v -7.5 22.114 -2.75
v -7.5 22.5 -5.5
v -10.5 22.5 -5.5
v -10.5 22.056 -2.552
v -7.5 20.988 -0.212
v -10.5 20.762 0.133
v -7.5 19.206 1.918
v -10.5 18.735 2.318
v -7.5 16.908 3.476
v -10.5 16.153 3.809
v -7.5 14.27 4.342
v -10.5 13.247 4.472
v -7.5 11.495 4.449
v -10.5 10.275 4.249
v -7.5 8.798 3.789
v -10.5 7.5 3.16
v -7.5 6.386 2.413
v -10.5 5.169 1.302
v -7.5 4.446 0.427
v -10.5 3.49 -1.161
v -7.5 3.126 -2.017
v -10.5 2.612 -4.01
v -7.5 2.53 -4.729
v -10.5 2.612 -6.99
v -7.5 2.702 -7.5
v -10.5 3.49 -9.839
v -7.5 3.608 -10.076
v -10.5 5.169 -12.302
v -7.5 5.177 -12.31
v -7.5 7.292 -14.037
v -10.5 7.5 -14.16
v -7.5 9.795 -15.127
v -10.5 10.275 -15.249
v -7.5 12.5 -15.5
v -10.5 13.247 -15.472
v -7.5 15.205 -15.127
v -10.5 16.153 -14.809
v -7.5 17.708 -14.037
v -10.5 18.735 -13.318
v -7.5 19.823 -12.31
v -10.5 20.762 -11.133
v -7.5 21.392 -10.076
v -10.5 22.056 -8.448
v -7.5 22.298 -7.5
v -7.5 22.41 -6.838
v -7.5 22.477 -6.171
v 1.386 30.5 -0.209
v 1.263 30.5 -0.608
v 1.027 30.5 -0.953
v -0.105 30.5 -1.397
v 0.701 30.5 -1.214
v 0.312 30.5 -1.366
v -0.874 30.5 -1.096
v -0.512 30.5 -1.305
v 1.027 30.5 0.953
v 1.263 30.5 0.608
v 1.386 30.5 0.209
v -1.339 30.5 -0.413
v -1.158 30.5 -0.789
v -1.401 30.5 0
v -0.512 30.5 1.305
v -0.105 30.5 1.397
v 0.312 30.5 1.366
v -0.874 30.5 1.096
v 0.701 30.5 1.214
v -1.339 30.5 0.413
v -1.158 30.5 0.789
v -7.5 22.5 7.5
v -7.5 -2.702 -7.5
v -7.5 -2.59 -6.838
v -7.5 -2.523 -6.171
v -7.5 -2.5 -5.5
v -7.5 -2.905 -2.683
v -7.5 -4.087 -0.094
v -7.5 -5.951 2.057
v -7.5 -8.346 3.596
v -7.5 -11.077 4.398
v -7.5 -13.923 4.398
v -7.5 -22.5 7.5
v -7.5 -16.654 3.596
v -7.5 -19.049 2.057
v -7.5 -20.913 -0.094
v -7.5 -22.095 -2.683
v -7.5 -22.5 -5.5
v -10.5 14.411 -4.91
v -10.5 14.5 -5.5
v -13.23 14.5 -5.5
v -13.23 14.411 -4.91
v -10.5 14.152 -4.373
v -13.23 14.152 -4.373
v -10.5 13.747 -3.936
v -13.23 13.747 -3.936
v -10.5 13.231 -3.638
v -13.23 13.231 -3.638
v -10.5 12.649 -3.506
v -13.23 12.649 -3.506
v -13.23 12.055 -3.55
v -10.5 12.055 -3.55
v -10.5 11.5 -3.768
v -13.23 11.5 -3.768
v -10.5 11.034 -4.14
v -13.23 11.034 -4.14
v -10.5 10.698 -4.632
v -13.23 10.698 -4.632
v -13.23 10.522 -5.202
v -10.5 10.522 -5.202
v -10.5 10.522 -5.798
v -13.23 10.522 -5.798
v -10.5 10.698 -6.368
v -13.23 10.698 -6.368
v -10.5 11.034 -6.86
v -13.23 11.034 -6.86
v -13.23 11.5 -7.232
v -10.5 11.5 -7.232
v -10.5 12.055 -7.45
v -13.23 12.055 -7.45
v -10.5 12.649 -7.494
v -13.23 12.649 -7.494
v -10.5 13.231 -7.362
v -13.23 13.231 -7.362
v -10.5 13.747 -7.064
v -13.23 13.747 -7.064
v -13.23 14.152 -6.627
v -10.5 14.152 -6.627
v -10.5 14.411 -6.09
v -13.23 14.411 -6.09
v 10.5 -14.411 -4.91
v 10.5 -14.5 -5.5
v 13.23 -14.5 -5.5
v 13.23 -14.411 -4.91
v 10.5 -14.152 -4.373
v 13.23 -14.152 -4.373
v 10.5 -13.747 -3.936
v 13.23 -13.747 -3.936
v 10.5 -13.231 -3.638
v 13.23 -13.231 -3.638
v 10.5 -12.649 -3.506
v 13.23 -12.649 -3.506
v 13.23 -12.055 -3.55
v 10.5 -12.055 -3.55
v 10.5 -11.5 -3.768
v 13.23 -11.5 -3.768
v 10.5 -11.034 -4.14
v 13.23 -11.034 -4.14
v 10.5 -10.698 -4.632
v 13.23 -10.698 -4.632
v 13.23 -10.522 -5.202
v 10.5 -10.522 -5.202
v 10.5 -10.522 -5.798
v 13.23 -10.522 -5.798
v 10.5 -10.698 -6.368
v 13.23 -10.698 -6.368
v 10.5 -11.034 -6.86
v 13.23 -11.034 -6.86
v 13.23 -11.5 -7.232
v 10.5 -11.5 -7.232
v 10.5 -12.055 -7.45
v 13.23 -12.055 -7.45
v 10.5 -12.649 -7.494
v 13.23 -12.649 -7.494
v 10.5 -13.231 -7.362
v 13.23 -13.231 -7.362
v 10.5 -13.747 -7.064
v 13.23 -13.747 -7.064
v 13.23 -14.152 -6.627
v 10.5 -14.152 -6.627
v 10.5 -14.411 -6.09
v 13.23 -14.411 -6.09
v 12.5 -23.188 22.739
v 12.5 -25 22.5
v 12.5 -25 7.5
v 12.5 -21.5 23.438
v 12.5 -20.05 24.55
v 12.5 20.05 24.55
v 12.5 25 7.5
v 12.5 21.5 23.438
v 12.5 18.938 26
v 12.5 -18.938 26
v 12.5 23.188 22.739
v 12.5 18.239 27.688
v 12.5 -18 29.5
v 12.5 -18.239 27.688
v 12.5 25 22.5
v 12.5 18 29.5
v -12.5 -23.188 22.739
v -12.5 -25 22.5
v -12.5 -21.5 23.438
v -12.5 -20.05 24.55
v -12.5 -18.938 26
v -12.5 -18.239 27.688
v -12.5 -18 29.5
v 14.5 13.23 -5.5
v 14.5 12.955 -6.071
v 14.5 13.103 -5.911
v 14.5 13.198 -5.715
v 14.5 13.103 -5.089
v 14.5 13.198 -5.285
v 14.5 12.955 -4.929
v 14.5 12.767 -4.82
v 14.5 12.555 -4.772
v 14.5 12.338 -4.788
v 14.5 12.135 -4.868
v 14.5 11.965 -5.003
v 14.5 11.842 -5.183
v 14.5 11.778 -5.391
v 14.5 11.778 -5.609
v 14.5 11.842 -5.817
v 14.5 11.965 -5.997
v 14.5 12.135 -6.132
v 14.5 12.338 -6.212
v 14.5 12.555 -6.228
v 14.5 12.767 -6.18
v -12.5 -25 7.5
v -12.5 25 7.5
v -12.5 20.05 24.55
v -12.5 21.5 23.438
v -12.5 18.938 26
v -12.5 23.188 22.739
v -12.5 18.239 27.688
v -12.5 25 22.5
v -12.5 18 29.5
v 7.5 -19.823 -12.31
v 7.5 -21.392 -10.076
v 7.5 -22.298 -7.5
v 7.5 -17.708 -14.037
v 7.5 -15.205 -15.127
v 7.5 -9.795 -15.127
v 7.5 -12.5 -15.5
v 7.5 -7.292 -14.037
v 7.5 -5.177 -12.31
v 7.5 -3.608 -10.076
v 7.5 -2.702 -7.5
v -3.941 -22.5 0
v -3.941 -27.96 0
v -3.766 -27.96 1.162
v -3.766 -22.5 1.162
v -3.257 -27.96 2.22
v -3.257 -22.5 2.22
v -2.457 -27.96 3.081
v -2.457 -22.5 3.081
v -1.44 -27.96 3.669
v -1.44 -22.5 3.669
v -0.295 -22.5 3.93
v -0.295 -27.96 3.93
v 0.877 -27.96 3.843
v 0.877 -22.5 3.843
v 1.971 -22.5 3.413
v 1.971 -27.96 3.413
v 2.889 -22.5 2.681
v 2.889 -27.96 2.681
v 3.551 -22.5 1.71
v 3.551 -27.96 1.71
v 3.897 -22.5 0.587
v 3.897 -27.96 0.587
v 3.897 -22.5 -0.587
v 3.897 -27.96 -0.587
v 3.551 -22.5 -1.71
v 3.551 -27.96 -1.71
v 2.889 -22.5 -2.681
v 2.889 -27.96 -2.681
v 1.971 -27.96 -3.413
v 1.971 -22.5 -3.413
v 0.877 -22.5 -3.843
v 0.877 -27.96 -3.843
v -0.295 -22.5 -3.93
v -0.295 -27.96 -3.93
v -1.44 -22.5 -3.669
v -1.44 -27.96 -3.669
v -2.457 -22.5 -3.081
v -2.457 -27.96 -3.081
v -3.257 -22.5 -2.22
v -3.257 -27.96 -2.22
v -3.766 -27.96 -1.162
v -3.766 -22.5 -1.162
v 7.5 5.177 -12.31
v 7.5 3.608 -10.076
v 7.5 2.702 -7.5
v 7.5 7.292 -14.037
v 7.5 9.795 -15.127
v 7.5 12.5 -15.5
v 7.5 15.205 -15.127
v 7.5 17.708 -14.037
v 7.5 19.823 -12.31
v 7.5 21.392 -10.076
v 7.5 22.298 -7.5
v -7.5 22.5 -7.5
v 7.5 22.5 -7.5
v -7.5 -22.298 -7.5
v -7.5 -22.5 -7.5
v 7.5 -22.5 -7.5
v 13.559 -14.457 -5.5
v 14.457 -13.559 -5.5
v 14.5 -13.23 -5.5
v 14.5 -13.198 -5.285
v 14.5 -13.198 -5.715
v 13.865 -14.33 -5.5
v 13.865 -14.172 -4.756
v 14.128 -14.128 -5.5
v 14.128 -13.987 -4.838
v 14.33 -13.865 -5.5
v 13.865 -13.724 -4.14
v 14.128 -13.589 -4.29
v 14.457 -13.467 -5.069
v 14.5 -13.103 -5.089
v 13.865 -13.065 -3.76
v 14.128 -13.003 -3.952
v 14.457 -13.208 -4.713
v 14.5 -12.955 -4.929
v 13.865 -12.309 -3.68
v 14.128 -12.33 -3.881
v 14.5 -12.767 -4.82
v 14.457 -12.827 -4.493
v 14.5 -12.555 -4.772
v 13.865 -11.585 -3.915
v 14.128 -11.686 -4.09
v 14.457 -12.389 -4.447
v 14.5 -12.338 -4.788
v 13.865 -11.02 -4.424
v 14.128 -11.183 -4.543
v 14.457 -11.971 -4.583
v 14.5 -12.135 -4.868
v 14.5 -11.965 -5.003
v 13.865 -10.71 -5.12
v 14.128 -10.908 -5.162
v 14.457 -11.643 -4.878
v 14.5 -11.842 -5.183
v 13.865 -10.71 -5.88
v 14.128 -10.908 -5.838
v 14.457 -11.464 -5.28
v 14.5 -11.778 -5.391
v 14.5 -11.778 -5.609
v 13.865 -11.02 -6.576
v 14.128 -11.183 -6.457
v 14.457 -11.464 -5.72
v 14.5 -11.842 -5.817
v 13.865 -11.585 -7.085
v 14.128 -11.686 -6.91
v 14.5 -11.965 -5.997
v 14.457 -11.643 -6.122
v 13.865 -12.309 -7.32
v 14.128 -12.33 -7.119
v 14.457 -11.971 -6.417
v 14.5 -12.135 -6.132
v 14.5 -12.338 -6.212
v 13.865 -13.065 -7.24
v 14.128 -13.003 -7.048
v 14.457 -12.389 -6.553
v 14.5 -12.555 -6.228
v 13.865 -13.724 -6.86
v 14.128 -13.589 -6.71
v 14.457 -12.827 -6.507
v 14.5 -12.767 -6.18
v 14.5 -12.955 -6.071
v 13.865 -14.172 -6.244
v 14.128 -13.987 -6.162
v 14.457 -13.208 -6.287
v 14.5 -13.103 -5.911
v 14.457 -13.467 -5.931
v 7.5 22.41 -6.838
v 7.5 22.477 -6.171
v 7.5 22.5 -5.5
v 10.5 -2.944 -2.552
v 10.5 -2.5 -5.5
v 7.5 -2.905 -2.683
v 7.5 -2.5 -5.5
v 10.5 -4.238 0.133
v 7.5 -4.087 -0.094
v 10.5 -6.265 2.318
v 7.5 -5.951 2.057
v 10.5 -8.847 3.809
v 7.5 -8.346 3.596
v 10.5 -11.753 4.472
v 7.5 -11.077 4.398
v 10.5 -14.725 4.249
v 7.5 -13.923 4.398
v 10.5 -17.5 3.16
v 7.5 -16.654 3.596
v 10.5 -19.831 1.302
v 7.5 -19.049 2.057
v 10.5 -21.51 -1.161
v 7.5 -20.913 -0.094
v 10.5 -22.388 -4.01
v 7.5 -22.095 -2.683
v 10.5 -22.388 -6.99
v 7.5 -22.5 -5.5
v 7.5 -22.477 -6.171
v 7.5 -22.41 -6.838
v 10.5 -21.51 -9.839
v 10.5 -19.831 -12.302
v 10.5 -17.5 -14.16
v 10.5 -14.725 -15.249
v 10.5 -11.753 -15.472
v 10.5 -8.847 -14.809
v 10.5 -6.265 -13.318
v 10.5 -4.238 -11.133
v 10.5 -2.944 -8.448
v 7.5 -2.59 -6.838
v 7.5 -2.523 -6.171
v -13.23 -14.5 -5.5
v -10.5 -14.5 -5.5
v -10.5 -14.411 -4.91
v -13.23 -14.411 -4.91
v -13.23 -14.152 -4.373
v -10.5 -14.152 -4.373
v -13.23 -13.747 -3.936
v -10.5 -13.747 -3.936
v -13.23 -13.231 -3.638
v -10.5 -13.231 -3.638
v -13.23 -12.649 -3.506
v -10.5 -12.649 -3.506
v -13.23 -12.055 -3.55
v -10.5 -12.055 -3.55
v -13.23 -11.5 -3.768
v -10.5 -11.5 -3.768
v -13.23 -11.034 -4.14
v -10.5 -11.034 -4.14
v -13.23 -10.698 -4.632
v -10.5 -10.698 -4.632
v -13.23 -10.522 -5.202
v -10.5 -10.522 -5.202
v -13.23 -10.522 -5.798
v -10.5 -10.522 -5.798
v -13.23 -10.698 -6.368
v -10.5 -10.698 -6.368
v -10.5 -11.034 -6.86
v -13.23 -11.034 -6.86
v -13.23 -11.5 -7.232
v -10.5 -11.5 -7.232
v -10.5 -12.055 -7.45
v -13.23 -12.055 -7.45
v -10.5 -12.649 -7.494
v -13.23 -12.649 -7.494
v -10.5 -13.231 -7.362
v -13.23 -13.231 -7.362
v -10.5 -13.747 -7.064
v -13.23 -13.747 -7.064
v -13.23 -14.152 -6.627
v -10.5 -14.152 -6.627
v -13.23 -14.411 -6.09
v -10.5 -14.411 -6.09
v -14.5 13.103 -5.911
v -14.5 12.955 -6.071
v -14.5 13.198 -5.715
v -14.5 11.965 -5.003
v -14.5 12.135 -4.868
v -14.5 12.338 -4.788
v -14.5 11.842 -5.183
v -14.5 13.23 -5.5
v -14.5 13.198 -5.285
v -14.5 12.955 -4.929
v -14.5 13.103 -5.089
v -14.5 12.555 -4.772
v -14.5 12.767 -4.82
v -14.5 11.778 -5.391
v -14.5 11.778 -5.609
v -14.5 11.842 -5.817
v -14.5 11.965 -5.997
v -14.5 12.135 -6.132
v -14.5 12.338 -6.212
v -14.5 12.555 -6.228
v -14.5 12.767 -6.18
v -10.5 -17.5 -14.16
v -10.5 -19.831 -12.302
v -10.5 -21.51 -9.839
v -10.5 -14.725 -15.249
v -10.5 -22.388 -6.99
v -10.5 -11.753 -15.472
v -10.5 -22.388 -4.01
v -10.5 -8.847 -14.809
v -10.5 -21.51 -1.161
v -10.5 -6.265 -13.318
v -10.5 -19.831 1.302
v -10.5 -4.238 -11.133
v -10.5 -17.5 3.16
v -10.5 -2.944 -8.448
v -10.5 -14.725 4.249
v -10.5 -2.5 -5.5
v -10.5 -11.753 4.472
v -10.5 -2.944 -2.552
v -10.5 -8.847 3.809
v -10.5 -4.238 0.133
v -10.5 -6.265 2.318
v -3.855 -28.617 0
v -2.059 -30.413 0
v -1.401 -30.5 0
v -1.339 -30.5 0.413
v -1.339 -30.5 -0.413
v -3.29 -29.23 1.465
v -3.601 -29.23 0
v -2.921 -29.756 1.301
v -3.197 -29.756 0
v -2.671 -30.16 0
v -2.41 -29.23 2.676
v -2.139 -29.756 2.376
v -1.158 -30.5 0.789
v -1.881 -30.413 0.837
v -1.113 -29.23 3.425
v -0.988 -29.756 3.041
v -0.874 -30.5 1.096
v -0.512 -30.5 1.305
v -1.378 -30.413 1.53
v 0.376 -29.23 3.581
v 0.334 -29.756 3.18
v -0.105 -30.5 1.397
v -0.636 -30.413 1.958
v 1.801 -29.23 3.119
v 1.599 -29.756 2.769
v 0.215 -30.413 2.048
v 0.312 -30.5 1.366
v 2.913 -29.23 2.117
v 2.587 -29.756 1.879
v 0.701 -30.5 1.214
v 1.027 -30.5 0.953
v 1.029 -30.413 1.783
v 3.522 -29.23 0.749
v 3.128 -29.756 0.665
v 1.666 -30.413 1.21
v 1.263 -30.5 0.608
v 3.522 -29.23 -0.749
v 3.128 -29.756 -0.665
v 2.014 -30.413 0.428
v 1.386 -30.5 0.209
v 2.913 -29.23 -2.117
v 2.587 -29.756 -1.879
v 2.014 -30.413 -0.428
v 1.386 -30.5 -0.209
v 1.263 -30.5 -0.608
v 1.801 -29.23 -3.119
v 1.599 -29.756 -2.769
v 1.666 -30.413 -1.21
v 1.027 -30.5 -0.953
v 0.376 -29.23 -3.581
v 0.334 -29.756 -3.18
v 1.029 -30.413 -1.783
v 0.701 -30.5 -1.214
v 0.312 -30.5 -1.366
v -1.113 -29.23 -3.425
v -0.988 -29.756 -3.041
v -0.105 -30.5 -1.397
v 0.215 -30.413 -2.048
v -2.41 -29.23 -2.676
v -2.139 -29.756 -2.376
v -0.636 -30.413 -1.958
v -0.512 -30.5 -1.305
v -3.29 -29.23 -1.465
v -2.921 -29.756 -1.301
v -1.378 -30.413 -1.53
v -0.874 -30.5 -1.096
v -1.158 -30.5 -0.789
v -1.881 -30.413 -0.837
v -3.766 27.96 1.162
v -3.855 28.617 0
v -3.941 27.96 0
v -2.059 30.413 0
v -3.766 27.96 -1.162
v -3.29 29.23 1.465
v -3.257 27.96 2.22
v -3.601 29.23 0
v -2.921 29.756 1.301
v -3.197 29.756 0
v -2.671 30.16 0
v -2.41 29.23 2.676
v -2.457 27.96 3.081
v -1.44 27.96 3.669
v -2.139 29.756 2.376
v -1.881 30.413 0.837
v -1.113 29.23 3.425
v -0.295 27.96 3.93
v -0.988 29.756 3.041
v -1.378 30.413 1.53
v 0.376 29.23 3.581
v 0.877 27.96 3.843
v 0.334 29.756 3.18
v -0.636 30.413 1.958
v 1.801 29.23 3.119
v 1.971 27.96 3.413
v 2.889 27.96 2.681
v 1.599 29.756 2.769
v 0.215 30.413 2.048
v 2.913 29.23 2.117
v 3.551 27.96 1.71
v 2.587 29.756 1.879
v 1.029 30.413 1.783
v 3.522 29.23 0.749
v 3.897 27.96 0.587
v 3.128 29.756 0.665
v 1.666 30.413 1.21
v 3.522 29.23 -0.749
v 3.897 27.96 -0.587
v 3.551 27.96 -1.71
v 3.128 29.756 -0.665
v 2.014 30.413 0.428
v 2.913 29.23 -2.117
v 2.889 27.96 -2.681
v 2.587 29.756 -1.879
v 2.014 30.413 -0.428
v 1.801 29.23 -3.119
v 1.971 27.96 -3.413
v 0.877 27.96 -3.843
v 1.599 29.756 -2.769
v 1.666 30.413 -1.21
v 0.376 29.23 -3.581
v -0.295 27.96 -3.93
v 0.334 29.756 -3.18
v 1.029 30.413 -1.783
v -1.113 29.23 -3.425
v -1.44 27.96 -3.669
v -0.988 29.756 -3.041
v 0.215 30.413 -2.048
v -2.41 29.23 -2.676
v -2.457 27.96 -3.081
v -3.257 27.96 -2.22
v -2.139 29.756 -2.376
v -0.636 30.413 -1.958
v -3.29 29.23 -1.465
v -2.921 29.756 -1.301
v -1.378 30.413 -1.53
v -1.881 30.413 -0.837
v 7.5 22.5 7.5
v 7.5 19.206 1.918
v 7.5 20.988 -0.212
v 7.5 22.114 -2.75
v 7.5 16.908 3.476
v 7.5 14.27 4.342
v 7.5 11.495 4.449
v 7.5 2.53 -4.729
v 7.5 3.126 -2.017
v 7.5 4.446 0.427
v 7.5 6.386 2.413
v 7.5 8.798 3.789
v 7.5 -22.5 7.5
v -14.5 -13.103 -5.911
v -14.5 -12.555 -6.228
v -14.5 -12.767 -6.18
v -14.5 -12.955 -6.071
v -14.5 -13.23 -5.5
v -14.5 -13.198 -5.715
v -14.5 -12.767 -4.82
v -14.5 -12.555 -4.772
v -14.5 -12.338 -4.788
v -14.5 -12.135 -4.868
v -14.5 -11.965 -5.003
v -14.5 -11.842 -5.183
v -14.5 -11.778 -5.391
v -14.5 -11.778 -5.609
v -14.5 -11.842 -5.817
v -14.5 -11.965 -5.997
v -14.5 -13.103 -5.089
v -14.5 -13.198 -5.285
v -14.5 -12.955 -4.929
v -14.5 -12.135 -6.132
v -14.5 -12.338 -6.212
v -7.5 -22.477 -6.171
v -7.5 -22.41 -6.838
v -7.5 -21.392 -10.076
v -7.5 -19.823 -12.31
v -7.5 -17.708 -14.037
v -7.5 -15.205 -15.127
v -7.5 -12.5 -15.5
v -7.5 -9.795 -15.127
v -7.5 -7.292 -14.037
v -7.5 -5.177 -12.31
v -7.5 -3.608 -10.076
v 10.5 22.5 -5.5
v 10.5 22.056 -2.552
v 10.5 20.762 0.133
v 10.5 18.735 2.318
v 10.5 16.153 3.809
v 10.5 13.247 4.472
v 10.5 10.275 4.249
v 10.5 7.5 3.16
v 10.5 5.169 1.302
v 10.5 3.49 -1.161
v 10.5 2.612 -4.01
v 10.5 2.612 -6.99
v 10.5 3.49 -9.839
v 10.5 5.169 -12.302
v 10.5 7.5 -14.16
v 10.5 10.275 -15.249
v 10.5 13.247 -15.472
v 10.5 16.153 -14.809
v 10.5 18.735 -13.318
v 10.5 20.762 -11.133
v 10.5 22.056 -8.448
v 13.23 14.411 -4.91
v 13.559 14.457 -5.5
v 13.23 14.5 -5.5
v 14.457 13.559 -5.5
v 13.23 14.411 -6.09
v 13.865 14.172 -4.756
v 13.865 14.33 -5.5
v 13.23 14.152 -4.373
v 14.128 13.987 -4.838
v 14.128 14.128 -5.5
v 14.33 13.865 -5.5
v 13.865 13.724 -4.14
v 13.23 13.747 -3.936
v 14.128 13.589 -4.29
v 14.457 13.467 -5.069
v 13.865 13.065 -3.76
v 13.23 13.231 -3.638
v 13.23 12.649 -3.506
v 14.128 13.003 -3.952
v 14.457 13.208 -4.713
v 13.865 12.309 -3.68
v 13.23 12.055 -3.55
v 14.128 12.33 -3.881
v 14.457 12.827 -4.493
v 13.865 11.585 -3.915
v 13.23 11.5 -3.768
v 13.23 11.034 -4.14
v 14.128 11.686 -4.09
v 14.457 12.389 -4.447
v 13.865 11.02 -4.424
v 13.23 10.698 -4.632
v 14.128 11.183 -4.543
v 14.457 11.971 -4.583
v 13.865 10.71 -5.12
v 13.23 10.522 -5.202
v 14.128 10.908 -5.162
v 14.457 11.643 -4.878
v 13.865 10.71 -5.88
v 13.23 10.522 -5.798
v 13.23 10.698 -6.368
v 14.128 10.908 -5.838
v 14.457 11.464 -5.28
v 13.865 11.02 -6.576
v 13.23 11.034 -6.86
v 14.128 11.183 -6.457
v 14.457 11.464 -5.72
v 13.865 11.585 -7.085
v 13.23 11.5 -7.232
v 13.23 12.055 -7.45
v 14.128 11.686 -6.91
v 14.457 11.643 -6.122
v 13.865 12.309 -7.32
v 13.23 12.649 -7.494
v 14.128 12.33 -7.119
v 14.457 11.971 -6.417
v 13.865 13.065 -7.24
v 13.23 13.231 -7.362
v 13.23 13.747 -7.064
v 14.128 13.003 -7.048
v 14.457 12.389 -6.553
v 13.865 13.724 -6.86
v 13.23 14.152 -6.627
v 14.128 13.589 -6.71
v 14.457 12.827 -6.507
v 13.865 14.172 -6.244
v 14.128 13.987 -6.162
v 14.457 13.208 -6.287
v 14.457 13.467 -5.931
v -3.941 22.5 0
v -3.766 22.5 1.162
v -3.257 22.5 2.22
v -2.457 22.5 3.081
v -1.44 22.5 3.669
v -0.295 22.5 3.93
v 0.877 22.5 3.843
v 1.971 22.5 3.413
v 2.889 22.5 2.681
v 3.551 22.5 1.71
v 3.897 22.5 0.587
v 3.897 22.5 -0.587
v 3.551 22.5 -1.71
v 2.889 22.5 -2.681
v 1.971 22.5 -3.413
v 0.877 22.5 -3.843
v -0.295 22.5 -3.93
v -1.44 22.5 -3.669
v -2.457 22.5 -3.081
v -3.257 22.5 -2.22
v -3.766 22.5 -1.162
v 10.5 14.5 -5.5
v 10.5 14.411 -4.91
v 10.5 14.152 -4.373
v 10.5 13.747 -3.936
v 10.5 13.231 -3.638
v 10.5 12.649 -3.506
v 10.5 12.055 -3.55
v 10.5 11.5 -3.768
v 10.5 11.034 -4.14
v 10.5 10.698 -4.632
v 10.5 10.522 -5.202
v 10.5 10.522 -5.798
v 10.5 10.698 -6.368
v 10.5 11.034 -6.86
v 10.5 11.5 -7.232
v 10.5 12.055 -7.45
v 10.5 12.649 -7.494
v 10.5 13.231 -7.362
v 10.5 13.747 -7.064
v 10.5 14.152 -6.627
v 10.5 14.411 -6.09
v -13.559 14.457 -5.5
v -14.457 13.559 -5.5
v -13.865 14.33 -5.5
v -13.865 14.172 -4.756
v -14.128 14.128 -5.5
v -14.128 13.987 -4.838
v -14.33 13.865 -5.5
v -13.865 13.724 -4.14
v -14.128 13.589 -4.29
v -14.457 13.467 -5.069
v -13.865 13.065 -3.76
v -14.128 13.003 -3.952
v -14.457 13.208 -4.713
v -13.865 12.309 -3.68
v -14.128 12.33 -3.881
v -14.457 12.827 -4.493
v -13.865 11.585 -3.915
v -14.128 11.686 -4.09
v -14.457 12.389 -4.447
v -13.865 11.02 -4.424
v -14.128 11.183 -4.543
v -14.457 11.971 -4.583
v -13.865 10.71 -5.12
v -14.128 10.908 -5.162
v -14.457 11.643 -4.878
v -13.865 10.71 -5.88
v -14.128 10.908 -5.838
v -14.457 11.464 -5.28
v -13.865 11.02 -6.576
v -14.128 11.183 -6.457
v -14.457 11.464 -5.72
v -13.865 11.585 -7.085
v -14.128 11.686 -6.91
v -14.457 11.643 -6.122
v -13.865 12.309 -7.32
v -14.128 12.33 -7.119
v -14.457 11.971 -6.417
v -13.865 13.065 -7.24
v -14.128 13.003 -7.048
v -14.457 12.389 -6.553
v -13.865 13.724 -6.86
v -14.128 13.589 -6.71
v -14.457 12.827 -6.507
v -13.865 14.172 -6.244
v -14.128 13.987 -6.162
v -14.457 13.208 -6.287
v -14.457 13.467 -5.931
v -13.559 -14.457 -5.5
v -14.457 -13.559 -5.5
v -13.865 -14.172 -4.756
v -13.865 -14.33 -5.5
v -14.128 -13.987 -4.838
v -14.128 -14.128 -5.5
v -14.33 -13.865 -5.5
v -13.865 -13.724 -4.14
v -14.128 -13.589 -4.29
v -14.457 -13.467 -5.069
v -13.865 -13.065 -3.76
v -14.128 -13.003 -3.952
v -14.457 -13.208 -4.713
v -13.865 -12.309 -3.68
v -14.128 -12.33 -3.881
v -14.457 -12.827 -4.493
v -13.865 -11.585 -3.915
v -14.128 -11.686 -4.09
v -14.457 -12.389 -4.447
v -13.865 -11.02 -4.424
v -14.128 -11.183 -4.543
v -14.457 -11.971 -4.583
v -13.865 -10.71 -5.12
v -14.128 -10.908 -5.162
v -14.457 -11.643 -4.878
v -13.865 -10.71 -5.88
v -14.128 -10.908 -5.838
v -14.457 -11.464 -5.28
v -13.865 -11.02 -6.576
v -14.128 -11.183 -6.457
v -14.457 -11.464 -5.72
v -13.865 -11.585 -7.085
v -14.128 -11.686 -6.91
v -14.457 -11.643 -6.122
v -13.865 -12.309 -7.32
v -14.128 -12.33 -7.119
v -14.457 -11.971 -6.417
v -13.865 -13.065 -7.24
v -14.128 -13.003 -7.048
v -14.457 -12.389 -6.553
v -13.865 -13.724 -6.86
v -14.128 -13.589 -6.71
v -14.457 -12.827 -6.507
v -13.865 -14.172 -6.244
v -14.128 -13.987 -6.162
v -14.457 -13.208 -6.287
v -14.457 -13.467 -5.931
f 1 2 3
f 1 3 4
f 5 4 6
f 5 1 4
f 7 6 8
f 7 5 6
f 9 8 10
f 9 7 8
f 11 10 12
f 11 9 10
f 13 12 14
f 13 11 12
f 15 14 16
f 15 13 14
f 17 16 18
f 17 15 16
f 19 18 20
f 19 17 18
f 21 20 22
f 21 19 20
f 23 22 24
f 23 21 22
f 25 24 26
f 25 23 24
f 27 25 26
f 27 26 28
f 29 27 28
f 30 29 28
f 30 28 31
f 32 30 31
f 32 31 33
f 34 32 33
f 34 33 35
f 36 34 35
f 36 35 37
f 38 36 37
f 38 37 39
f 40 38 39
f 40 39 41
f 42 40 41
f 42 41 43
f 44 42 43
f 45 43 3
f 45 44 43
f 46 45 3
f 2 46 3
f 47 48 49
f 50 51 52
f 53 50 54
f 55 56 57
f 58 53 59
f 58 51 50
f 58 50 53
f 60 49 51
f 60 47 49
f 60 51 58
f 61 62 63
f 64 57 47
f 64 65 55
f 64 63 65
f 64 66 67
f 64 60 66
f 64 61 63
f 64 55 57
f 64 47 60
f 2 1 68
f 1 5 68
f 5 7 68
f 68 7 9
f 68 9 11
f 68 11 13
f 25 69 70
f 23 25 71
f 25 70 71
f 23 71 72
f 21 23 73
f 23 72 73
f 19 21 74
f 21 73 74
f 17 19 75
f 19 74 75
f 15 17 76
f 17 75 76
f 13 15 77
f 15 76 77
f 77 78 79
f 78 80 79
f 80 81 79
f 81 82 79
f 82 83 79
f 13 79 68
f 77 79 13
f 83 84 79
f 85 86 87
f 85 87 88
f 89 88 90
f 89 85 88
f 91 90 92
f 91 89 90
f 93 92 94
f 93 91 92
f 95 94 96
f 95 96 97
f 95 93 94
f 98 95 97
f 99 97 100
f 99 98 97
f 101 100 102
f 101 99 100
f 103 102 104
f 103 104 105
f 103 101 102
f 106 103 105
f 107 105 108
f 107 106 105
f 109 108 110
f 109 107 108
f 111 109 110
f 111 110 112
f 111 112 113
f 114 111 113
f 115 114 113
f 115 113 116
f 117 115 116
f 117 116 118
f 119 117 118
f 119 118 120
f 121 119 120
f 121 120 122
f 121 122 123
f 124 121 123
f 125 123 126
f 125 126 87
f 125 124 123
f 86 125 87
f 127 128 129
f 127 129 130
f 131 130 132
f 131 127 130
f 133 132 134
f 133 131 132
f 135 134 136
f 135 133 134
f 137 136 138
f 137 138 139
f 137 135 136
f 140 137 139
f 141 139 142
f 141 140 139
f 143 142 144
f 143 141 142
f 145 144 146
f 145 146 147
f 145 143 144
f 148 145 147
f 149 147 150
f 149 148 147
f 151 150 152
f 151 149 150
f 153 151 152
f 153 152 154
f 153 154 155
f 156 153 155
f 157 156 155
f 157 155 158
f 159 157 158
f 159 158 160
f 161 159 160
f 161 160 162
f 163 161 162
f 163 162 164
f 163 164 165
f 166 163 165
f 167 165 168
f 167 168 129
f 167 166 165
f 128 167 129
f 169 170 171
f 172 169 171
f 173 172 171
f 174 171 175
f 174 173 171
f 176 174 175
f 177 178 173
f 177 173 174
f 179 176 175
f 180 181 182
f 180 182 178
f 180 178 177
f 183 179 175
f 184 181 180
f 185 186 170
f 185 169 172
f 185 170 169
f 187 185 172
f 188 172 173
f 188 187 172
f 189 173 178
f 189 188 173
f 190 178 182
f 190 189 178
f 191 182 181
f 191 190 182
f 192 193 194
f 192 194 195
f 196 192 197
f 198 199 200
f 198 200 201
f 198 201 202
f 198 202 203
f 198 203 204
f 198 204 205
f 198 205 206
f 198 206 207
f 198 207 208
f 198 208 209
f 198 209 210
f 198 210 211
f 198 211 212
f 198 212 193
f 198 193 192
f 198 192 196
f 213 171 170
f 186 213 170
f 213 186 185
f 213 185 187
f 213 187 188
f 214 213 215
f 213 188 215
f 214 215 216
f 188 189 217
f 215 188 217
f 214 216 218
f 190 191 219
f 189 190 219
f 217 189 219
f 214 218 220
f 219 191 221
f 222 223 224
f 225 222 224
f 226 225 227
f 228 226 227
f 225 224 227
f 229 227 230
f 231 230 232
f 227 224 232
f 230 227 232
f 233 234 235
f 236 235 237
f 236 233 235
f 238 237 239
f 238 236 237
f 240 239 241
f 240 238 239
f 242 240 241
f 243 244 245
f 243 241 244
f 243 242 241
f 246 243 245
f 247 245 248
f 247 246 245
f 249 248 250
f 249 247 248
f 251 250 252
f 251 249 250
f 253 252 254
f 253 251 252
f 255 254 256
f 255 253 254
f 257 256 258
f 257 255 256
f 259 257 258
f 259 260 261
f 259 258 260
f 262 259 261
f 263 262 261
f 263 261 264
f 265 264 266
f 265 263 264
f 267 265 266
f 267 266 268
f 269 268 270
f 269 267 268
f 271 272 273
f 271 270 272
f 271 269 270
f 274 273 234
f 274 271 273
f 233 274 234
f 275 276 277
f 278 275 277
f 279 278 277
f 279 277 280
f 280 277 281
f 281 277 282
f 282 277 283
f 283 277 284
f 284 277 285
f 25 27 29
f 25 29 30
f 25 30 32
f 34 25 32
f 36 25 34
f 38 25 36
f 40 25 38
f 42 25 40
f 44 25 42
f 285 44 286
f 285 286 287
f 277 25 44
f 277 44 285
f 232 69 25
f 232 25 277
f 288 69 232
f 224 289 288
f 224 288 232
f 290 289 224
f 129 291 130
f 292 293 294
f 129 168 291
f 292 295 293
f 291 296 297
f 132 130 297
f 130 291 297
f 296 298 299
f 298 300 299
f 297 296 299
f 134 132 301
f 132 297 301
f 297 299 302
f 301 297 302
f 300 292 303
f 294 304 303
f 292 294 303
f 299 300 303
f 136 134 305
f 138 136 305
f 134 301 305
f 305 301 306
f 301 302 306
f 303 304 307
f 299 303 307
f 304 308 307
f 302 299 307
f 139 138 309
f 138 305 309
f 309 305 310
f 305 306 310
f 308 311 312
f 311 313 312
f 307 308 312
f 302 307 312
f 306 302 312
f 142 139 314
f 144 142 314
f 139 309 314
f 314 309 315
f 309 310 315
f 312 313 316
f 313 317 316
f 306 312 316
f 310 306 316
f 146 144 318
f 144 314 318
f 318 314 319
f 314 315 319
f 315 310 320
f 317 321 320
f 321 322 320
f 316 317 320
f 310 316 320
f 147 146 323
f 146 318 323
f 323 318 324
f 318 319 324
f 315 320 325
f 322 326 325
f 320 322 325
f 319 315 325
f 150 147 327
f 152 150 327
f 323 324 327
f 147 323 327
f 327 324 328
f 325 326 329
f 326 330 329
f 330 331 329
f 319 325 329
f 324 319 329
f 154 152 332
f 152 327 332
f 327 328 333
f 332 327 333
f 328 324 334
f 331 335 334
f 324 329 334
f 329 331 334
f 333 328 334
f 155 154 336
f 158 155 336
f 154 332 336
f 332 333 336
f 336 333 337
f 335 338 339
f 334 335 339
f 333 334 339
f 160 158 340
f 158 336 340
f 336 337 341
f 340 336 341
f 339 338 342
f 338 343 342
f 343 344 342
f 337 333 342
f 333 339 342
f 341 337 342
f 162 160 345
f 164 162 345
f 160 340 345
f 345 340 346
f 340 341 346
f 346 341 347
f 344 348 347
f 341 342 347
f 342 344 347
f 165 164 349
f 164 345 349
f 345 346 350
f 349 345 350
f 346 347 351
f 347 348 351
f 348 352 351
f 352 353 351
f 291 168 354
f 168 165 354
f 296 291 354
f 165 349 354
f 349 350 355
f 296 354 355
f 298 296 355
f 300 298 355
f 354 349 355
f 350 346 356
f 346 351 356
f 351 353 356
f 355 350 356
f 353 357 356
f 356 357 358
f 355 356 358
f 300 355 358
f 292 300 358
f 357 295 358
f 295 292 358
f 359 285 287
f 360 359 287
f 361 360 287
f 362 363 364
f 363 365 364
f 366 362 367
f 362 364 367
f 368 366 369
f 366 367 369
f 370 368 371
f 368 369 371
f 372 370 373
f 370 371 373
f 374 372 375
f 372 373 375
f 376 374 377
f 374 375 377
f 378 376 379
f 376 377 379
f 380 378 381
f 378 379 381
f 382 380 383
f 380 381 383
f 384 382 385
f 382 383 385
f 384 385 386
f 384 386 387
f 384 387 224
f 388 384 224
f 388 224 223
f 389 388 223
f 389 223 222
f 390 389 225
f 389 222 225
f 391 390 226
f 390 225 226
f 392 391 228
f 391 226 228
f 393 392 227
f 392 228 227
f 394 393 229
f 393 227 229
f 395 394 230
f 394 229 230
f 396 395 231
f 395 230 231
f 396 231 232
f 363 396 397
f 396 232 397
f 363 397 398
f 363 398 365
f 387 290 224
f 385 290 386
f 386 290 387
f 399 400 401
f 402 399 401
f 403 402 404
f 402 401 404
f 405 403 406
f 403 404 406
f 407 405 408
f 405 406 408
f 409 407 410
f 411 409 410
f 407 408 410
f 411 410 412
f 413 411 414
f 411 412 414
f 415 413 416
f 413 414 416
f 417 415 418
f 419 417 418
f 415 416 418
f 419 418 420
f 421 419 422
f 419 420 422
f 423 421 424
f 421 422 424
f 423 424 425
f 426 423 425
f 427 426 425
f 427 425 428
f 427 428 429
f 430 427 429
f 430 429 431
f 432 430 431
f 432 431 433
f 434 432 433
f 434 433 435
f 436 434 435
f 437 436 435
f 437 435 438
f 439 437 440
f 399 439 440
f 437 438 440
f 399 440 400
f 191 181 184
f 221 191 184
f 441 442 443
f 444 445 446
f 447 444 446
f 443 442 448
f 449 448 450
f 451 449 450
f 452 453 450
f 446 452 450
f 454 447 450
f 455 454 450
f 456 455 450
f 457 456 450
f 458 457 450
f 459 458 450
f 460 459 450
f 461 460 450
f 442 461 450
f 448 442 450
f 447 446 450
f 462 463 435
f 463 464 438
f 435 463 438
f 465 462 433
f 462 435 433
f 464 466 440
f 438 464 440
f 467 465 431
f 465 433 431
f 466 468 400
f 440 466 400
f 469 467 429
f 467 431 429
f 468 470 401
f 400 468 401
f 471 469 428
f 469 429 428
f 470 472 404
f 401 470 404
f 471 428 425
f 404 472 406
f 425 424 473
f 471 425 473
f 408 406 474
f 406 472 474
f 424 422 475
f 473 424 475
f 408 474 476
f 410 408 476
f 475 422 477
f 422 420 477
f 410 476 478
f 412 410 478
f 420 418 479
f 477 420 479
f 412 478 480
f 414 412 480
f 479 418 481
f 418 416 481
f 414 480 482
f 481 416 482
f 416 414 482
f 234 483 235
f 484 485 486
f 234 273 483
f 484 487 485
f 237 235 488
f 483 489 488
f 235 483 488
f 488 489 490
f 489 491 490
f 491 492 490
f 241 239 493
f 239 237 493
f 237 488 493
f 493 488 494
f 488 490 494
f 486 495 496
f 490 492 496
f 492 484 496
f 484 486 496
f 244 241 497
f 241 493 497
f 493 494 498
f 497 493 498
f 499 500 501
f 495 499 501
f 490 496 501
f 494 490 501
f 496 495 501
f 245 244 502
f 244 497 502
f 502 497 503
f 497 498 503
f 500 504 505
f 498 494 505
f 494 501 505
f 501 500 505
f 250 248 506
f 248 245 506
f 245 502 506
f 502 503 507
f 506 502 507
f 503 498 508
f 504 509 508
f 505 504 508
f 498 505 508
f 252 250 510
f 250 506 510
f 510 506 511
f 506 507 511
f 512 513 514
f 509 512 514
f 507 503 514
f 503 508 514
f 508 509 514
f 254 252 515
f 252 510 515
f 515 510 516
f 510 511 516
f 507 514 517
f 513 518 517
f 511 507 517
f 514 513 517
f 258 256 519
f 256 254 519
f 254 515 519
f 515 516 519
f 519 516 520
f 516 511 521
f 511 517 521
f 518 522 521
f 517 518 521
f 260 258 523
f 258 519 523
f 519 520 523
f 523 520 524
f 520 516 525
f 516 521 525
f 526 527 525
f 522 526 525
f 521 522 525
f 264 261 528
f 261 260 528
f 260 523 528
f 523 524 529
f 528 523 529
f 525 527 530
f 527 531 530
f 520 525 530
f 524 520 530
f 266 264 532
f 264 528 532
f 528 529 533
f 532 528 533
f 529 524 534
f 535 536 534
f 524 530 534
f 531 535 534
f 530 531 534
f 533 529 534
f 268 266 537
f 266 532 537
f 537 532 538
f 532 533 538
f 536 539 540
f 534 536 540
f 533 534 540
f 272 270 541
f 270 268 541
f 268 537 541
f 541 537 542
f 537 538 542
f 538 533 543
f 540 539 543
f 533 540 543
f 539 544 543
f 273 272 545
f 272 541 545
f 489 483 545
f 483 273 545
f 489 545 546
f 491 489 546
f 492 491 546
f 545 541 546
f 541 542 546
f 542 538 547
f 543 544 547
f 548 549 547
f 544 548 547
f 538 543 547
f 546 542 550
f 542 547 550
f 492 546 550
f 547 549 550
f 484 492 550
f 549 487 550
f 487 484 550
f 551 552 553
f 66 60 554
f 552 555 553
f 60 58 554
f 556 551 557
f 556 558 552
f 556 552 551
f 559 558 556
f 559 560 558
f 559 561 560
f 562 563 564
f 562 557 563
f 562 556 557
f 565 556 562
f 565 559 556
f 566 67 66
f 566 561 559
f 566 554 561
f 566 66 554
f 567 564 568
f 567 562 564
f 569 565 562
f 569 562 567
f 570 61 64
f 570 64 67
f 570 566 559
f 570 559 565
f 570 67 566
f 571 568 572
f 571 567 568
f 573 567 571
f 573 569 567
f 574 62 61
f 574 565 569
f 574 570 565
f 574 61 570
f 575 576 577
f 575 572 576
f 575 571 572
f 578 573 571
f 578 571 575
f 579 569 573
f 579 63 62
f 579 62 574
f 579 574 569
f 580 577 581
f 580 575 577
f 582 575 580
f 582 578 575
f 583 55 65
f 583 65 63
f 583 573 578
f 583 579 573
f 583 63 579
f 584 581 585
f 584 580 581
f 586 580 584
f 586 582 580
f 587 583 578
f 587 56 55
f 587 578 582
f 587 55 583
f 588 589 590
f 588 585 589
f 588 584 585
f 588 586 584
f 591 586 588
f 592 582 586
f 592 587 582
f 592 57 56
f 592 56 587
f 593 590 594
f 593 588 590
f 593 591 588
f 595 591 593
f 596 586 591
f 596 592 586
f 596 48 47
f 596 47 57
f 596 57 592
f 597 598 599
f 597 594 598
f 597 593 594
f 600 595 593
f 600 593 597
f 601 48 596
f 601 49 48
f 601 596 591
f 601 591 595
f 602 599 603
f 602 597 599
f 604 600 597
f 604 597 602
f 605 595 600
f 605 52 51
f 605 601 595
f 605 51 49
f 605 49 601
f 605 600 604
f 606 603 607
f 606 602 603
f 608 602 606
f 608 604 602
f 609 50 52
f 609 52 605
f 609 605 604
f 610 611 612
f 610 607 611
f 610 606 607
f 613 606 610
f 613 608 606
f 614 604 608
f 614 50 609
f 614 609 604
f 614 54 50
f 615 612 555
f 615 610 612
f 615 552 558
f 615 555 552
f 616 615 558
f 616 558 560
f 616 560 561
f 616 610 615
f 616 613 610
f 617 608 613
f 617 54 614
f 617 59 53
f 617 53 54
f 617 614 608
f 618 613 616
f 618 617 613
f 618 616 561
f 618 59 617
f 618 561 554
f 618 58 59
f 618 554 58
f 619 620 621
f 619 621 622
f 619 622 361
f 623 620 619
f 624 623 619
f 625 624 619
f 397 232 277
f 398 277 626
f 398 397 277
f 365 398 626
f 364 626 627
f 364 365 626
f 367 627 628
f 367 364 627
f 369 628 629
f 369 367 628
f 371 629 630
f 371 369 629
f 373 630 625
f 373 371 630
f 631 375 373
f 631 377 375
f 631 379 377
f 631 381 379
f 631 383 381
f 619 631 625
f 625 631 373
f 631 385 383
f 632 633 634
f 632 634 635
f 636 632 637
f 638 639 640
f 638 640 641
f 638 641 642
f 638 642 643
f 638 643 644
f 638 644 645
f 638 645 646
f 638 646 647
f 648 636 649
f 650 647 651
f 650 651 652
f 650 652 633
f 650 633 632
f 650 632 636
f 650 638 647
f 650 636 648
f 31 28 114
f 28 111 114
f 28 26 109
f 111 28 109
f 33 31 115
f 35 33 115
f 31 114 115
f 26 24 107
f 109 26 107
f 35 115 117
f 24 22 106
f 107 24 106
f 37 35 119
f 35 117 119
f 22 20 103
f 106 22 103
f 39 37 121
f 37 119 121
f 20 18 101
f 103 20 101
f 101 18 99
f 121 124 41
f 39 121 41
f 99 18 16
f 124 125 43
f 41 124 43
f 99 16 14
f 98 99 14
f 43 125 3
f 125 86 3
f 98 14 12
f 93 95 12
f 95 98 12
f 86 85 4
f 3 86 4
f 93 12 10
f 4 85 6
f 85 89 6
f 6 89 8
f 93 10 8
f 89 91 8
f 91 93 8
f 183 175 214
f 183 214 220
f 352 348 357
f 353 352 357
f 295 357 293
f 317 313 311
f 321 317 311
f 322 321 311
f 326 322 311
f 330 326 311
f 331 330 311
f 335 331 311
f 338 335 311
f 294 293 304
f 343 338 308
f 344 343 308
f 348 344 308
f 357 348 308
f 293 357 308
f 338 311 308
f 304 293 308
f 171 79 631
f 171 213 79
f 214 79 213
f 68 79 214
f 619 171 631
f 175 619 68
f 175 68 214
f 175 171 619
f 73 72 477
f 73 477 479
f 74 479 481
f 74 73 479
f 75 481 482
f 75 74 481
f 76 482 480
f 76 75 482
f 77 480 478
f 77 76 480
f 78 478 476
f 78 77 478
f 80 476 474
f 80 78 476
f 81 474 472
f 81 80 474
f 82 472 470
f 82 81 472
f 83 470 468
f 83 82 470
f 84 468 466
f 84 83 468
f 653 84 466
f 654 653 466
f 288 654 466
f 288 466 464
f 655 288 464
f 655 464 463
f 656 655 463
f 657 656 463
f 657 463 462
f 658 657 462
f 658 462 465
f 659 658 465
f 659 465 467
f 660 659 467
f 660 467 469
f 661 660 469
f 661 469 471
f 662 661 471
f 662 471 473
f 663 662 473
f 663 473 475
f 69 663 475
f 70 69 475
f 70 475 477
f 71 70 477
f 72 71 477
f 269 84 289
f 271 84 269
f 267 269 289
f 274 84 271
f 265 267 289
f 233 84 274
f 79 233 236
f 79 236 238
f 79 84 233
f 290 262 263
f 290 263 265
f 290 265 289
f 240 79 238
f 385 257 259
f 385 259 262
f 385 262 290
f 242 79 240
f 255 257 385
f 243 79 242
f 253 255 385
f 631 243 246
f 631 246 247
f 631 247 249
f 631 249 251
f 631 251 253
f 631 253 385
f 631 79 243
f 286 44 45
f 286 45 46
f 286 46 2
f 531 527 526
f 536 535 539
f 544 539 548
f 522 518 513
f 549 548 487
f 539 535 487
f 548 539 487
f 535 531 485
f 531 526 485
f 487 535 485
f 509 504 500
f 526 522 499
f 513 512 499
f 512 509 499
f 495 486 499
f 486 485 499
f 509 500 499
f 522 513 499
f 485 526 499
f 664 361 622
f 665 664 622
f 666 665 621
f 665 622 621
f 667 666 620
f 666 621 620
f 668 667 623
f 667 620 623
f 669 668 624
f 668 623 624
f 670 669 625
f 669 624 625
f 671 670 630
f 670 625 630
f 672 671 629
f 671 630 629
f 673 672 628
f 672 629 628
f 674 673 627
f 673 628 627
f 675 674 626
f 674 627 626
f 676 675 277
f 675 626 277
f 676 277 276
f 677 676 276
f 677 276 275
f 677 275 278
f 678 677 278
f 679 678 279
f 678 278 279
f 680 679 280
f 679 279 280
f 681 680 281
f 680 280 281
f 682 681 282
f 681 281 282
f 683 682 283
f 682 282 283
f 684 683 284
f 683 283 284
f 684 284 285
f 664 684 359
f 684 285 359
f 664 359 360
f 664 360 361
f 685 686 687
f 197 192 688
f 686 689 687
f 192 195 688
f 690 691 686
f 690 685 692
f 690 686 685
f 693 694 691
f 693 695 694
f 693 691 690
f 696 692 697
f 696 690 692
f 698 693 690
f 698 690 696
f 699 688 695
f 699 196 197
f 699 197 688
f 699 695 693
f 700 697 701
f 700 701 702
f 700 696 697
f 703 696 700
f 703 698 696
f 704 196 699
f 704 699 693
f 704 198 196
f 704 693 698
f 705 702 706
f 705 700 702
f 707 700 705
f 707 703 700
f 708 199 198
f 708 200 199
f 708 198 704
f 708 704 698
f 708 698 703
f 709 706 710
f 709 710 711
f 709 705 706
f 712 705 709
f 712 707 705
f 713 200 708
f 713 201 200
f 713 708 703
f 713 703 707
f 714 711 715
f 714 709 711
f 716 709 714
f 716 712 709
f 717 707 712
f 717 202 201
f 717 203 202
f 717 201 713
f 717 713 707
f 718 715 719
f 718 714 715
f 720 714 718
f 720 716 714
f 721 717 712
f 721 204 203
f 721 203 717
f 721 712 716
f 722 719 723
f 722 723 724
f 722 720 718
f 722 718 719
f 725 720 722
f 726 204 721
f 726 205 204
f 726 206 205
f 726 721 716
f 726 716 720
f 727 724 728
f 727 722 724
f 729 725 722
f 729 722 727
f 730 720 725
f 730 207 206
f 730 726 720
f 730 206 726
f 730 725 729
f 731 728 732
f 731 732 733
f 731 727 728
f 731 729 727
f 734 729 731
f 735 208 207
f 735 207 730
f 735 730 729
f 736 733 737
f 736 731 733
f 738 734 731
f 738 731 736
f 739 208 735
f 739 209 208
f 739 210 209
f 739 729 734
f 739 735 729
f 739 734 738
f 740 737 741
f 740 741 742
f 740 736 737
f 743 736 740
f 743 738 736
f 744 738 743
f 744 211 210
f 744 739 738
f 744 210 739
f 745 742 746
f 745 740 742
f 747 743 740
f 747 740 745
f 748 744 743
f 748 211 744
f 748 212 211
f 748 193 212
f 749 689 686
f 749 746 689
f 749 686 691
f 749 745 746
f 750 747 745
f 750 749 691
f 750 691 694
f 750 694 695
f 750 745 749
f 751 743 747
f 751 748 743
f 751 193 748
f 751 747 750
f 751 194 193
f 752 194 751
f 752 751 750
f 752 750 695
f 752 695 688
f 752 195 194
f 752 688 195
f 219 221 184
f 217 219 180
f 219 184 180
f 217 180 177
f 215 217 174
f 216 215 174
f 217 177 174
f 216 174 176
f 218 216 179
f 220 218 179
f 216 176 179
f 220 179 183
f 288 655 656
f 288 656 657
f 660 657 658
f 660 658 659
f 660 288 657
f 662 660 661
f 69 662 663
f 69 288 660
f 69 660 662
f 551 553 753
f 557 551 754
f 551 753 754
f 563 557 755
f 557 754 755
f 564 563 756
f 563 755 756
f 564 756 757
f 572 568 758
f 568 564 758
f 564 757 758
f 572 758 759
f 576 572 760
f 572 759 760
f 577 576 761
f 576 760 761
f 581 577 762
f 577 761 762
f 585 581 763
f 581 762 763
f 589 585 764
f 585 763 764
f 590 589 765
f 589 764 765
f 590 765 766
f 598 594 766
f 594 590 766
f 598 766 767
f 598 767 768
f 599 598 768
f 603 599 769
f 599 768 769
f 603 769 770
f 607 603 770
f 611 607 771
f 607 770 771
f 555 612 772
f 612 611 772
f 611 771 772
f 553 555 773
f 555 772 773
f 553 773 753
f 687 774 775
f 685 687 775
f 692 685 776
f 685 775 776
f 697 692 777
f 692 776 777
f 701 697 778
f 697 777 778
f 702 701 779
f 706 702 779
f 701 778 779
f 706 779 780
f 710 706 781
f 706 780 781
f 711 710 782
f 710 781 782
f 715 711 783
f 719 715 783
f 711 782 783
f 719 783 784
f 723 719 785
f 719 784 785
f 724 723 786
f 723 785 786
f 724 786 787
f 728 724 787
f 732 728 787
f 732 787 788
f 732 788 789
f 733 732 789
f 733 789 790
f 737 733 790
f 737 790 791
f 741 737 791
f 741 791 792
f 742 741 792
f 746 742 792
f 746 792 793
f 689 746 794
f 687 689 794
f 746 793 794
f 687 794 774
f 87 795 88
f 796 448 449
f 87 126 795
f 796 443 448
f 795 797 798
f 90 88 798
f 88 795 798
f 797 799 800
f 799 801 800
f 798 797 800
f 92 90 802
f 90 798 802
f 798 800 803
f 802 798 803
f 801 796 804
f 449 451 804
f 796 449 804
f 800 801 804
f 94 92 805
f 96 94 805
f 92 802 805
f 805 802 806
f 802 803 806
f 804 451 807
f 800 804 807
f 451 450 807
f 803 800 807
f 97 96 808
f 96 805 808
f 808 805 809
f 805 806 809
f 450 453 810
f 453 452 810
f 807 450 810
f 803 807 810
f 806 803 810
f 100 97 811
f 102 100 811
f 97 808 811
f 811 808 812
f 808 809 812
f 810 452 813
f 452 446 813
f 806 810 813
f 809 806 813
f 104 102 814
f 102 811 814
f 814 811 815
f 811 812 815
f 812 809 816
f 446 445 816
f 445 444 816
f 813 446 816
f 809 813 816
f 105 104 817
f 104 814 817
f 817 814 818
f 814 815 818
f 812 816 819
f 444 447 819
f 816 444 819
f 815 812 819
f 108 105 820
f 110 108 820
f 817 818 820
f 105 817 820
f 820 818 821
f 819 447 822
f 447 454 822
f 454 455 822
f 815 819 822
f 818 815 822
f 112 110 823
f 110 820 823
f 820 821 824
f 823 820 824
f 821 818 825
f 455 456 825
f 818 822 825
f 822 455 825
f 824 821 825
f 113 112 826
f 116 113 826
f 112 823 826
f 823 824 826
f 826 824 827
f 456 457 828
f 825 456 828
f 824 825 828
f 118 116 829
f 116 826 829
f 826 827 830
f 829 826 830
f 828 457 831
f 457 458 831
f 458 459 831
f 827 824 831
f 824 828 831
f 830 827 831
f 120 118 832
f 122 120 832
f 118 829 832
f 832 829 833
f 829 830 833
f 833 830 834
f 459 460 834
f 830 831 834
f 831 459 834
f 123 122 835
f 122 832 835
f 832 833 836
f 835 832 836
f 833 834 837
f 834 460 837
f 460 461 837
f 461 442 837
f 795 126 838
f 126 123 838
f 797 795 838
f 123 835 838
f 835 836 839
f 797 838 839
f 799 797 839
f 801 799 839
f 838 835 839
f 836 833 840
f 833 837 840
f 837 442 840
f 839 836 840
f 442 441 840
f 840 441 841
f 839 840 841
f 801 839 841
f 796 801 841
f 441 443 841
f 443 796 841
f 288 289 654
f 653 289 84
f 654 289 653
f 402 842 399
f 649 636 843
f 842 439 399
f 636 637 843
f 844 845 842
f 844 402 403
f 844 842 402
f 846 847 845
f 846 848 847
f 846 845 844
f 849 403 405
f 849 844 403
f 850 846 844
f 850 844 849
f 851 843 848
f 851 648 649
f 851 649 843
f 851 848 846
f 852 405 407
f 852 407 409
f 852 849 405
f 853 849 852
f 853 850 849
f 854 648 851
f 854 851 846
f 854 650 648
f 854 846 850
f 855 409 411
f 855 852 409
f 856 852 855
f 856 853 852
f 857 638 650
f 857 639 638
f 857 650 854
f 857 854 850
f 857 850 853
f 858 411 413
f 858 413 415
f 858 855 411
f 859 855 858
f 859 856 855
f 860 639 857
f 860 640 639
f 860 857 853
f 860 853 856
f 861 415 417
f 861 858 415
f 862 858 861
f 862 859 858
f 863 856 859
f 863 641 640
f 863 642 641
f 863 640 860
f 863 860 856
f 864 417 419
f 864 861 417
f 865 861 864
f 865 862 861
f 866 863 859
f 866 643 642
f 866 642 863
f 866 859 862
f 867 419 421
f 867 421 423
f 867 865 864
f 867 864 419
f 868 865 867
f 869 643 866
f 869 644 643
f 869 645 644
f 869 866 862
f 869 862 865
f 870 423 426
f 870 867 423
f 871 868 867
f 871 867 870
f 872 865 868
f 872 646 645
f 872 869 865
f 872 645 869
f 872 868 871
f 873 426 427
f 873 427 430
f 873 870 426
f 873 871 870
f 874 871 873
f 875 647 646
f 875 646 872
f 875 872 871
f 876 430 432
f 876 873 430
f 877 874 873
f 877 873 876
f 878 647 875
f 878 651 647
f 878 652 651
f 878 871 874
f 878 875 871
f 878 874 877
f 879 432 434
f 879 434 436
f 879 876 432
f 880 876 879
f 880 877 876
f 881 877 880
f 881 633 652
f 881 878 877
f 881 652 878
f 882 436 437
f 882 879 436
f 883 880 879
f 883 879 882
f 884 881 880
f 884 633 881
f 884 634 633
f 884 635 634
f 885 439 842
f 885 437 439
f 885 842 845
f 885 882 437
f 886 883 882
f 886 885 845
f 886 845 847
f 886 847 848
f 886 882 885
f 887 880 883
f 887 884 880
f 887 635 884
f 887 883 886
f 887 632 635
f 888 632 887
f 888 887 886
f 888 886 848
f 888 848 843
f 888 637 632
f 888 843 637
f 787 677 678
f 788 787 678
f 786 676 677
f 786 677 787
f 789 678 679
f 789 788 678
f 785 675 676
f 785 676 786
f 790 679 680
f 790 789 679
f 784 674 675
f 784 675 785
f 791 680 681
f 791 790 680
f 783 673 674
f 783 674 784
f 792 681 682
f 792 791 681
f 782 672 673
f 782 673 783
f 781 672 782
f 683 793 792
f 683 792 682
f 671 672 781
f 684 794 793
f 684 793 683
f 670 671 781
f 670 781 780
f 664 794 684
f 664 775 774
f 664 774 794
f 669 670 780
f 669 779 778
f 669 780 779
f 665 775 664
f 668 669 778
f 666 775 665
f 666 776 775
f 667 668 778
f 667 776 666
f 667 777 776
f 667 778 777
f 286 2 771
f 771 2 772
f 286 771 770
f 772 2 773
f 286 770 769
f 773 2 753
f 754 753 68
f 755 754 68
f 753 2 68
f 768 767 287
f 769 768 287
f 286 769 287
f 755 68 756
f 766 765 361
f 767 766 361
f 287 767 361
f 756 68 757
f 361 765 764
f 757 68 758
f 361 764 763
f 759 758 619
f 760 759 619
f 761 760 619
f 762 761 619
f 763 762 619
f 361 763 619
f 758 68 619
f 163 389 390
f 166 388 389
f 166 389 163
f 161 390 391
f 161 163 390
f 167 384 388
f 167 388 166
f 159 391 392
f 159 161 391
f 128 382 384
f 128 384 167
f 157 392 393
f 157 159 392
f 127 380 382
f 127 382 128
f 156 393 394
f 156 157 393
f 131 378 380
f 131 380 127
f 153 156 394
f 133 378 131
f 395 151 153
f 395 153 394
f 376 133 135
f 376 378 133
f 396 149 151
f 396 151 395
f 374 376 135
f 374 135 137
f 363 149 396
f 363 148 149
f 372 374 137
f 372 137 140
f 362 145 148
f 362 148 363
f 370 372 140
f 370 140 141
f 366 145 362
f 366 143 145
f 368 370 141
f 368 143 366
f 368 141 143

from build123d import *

# Parameters (mm, degrees)
F0_W      = 15
F0_H      = 15
F1_DEPTH  = 22.5
F2_W      = 50
F2_H      = 22
F3_DEPTH  = 12.5
F5_DEPTH  = 12.7
F6_R      = 10
F7_DEPTH  = 3
F8_R      = 2
F9_DEPTH  = 4
F10_R     = 1.27
F11_R     = 3.941379
F12_DEPTH = 8
F13_R     = 2.54


with BuildPart() as f1:
    # F0 (on Front) → F1 (new body, symmetric)
    with BuildSketch(Plane.XZ):
        Rectangle(F0_W, F0_H)
    extrude(amount=F1_DEPTH, both=True)

    # F2 (on Right) → F3 (join, symmetric)
    with BuildSketch(Plane.YZ):
        with Locations((0, 18.5)):
            Rectangle(F2_W, F2_H)
    extrude(amount=F3_DEPTH, both=True)

    # F4 (on Right) → F5 (cut, symmetric)
    with BuildSketch(Plane.YZ):
        with BuildLine():
            Line((-25, 29.5), (-25, 22.5))
            ThreePointArc((-25, 22.5), (-20.050253, 24.550253), (-18, 29.5))
            Line((-18, 29.5), (-25, 29.5))
        make_face()
        with BuildLine():
            ThreePointArc((18, 29.5), (20.050253, 24.550253), (25, 22.5))
            Line((25, 22.5), (25, 29.5))
            Line((25, 29.5), (18, 29.5))
        make_face()
    extrude(amount=F5_DEPTH, both=True, mode=Mode.SUBTRACT)

    # F6 (on face) → F7 (join)
    with BuildSketch(Plane.YZ.offset(7.5)):
        with Locations((12.5, -5.5)):
            Circle(F6_R)
        with Locations((-12.5, -5.5)):
            Circle(F6_R)
    extrude(amount=F7_DEPTH)

    # F8 (on face) → F9 (join)
    with BuildSketch(Plane.YZ.offset(10.5)):
        with Locations((12.5, -5.5)):
            Circle(F8_R)
    extrude(amount=F9_DEPTH)

    # F10
    f10_edges = [f1.edges().sort_by_distance(p)[0] for p in [
        (14.5, 10.5, -5.5),
    ]]
    fillet(f10_edges, radius=F10_R)

    # F11 (on face) → F12 (join)
    with BuildSketch(Plane(origin=(0, 22.5, 0), x_dir=(-1, 0, 0), z_dir=(0, 1, 0))):
        Circle(F11_R)
    extrude(amount=F12_DEPTH)

    # F13
    f13_edges = [f1.edges().sort_by_distance(p)[0] for p in [
        (3.941379, 30.5, 0),
    ]]
    fillet(f13_edges, radius=F13_R)

    # F14: F1 across plane


with BuildPart() as f1_1:
    add(f1.part)
    add(f1.part.mirror(Plane.YZ))

    # F15: F1 across plane


with BuildPart() as f1_2:
    add(f1_1.part)
    add(f1_1.part.mirror(Plane.XZ))


solid = f1_2.part
